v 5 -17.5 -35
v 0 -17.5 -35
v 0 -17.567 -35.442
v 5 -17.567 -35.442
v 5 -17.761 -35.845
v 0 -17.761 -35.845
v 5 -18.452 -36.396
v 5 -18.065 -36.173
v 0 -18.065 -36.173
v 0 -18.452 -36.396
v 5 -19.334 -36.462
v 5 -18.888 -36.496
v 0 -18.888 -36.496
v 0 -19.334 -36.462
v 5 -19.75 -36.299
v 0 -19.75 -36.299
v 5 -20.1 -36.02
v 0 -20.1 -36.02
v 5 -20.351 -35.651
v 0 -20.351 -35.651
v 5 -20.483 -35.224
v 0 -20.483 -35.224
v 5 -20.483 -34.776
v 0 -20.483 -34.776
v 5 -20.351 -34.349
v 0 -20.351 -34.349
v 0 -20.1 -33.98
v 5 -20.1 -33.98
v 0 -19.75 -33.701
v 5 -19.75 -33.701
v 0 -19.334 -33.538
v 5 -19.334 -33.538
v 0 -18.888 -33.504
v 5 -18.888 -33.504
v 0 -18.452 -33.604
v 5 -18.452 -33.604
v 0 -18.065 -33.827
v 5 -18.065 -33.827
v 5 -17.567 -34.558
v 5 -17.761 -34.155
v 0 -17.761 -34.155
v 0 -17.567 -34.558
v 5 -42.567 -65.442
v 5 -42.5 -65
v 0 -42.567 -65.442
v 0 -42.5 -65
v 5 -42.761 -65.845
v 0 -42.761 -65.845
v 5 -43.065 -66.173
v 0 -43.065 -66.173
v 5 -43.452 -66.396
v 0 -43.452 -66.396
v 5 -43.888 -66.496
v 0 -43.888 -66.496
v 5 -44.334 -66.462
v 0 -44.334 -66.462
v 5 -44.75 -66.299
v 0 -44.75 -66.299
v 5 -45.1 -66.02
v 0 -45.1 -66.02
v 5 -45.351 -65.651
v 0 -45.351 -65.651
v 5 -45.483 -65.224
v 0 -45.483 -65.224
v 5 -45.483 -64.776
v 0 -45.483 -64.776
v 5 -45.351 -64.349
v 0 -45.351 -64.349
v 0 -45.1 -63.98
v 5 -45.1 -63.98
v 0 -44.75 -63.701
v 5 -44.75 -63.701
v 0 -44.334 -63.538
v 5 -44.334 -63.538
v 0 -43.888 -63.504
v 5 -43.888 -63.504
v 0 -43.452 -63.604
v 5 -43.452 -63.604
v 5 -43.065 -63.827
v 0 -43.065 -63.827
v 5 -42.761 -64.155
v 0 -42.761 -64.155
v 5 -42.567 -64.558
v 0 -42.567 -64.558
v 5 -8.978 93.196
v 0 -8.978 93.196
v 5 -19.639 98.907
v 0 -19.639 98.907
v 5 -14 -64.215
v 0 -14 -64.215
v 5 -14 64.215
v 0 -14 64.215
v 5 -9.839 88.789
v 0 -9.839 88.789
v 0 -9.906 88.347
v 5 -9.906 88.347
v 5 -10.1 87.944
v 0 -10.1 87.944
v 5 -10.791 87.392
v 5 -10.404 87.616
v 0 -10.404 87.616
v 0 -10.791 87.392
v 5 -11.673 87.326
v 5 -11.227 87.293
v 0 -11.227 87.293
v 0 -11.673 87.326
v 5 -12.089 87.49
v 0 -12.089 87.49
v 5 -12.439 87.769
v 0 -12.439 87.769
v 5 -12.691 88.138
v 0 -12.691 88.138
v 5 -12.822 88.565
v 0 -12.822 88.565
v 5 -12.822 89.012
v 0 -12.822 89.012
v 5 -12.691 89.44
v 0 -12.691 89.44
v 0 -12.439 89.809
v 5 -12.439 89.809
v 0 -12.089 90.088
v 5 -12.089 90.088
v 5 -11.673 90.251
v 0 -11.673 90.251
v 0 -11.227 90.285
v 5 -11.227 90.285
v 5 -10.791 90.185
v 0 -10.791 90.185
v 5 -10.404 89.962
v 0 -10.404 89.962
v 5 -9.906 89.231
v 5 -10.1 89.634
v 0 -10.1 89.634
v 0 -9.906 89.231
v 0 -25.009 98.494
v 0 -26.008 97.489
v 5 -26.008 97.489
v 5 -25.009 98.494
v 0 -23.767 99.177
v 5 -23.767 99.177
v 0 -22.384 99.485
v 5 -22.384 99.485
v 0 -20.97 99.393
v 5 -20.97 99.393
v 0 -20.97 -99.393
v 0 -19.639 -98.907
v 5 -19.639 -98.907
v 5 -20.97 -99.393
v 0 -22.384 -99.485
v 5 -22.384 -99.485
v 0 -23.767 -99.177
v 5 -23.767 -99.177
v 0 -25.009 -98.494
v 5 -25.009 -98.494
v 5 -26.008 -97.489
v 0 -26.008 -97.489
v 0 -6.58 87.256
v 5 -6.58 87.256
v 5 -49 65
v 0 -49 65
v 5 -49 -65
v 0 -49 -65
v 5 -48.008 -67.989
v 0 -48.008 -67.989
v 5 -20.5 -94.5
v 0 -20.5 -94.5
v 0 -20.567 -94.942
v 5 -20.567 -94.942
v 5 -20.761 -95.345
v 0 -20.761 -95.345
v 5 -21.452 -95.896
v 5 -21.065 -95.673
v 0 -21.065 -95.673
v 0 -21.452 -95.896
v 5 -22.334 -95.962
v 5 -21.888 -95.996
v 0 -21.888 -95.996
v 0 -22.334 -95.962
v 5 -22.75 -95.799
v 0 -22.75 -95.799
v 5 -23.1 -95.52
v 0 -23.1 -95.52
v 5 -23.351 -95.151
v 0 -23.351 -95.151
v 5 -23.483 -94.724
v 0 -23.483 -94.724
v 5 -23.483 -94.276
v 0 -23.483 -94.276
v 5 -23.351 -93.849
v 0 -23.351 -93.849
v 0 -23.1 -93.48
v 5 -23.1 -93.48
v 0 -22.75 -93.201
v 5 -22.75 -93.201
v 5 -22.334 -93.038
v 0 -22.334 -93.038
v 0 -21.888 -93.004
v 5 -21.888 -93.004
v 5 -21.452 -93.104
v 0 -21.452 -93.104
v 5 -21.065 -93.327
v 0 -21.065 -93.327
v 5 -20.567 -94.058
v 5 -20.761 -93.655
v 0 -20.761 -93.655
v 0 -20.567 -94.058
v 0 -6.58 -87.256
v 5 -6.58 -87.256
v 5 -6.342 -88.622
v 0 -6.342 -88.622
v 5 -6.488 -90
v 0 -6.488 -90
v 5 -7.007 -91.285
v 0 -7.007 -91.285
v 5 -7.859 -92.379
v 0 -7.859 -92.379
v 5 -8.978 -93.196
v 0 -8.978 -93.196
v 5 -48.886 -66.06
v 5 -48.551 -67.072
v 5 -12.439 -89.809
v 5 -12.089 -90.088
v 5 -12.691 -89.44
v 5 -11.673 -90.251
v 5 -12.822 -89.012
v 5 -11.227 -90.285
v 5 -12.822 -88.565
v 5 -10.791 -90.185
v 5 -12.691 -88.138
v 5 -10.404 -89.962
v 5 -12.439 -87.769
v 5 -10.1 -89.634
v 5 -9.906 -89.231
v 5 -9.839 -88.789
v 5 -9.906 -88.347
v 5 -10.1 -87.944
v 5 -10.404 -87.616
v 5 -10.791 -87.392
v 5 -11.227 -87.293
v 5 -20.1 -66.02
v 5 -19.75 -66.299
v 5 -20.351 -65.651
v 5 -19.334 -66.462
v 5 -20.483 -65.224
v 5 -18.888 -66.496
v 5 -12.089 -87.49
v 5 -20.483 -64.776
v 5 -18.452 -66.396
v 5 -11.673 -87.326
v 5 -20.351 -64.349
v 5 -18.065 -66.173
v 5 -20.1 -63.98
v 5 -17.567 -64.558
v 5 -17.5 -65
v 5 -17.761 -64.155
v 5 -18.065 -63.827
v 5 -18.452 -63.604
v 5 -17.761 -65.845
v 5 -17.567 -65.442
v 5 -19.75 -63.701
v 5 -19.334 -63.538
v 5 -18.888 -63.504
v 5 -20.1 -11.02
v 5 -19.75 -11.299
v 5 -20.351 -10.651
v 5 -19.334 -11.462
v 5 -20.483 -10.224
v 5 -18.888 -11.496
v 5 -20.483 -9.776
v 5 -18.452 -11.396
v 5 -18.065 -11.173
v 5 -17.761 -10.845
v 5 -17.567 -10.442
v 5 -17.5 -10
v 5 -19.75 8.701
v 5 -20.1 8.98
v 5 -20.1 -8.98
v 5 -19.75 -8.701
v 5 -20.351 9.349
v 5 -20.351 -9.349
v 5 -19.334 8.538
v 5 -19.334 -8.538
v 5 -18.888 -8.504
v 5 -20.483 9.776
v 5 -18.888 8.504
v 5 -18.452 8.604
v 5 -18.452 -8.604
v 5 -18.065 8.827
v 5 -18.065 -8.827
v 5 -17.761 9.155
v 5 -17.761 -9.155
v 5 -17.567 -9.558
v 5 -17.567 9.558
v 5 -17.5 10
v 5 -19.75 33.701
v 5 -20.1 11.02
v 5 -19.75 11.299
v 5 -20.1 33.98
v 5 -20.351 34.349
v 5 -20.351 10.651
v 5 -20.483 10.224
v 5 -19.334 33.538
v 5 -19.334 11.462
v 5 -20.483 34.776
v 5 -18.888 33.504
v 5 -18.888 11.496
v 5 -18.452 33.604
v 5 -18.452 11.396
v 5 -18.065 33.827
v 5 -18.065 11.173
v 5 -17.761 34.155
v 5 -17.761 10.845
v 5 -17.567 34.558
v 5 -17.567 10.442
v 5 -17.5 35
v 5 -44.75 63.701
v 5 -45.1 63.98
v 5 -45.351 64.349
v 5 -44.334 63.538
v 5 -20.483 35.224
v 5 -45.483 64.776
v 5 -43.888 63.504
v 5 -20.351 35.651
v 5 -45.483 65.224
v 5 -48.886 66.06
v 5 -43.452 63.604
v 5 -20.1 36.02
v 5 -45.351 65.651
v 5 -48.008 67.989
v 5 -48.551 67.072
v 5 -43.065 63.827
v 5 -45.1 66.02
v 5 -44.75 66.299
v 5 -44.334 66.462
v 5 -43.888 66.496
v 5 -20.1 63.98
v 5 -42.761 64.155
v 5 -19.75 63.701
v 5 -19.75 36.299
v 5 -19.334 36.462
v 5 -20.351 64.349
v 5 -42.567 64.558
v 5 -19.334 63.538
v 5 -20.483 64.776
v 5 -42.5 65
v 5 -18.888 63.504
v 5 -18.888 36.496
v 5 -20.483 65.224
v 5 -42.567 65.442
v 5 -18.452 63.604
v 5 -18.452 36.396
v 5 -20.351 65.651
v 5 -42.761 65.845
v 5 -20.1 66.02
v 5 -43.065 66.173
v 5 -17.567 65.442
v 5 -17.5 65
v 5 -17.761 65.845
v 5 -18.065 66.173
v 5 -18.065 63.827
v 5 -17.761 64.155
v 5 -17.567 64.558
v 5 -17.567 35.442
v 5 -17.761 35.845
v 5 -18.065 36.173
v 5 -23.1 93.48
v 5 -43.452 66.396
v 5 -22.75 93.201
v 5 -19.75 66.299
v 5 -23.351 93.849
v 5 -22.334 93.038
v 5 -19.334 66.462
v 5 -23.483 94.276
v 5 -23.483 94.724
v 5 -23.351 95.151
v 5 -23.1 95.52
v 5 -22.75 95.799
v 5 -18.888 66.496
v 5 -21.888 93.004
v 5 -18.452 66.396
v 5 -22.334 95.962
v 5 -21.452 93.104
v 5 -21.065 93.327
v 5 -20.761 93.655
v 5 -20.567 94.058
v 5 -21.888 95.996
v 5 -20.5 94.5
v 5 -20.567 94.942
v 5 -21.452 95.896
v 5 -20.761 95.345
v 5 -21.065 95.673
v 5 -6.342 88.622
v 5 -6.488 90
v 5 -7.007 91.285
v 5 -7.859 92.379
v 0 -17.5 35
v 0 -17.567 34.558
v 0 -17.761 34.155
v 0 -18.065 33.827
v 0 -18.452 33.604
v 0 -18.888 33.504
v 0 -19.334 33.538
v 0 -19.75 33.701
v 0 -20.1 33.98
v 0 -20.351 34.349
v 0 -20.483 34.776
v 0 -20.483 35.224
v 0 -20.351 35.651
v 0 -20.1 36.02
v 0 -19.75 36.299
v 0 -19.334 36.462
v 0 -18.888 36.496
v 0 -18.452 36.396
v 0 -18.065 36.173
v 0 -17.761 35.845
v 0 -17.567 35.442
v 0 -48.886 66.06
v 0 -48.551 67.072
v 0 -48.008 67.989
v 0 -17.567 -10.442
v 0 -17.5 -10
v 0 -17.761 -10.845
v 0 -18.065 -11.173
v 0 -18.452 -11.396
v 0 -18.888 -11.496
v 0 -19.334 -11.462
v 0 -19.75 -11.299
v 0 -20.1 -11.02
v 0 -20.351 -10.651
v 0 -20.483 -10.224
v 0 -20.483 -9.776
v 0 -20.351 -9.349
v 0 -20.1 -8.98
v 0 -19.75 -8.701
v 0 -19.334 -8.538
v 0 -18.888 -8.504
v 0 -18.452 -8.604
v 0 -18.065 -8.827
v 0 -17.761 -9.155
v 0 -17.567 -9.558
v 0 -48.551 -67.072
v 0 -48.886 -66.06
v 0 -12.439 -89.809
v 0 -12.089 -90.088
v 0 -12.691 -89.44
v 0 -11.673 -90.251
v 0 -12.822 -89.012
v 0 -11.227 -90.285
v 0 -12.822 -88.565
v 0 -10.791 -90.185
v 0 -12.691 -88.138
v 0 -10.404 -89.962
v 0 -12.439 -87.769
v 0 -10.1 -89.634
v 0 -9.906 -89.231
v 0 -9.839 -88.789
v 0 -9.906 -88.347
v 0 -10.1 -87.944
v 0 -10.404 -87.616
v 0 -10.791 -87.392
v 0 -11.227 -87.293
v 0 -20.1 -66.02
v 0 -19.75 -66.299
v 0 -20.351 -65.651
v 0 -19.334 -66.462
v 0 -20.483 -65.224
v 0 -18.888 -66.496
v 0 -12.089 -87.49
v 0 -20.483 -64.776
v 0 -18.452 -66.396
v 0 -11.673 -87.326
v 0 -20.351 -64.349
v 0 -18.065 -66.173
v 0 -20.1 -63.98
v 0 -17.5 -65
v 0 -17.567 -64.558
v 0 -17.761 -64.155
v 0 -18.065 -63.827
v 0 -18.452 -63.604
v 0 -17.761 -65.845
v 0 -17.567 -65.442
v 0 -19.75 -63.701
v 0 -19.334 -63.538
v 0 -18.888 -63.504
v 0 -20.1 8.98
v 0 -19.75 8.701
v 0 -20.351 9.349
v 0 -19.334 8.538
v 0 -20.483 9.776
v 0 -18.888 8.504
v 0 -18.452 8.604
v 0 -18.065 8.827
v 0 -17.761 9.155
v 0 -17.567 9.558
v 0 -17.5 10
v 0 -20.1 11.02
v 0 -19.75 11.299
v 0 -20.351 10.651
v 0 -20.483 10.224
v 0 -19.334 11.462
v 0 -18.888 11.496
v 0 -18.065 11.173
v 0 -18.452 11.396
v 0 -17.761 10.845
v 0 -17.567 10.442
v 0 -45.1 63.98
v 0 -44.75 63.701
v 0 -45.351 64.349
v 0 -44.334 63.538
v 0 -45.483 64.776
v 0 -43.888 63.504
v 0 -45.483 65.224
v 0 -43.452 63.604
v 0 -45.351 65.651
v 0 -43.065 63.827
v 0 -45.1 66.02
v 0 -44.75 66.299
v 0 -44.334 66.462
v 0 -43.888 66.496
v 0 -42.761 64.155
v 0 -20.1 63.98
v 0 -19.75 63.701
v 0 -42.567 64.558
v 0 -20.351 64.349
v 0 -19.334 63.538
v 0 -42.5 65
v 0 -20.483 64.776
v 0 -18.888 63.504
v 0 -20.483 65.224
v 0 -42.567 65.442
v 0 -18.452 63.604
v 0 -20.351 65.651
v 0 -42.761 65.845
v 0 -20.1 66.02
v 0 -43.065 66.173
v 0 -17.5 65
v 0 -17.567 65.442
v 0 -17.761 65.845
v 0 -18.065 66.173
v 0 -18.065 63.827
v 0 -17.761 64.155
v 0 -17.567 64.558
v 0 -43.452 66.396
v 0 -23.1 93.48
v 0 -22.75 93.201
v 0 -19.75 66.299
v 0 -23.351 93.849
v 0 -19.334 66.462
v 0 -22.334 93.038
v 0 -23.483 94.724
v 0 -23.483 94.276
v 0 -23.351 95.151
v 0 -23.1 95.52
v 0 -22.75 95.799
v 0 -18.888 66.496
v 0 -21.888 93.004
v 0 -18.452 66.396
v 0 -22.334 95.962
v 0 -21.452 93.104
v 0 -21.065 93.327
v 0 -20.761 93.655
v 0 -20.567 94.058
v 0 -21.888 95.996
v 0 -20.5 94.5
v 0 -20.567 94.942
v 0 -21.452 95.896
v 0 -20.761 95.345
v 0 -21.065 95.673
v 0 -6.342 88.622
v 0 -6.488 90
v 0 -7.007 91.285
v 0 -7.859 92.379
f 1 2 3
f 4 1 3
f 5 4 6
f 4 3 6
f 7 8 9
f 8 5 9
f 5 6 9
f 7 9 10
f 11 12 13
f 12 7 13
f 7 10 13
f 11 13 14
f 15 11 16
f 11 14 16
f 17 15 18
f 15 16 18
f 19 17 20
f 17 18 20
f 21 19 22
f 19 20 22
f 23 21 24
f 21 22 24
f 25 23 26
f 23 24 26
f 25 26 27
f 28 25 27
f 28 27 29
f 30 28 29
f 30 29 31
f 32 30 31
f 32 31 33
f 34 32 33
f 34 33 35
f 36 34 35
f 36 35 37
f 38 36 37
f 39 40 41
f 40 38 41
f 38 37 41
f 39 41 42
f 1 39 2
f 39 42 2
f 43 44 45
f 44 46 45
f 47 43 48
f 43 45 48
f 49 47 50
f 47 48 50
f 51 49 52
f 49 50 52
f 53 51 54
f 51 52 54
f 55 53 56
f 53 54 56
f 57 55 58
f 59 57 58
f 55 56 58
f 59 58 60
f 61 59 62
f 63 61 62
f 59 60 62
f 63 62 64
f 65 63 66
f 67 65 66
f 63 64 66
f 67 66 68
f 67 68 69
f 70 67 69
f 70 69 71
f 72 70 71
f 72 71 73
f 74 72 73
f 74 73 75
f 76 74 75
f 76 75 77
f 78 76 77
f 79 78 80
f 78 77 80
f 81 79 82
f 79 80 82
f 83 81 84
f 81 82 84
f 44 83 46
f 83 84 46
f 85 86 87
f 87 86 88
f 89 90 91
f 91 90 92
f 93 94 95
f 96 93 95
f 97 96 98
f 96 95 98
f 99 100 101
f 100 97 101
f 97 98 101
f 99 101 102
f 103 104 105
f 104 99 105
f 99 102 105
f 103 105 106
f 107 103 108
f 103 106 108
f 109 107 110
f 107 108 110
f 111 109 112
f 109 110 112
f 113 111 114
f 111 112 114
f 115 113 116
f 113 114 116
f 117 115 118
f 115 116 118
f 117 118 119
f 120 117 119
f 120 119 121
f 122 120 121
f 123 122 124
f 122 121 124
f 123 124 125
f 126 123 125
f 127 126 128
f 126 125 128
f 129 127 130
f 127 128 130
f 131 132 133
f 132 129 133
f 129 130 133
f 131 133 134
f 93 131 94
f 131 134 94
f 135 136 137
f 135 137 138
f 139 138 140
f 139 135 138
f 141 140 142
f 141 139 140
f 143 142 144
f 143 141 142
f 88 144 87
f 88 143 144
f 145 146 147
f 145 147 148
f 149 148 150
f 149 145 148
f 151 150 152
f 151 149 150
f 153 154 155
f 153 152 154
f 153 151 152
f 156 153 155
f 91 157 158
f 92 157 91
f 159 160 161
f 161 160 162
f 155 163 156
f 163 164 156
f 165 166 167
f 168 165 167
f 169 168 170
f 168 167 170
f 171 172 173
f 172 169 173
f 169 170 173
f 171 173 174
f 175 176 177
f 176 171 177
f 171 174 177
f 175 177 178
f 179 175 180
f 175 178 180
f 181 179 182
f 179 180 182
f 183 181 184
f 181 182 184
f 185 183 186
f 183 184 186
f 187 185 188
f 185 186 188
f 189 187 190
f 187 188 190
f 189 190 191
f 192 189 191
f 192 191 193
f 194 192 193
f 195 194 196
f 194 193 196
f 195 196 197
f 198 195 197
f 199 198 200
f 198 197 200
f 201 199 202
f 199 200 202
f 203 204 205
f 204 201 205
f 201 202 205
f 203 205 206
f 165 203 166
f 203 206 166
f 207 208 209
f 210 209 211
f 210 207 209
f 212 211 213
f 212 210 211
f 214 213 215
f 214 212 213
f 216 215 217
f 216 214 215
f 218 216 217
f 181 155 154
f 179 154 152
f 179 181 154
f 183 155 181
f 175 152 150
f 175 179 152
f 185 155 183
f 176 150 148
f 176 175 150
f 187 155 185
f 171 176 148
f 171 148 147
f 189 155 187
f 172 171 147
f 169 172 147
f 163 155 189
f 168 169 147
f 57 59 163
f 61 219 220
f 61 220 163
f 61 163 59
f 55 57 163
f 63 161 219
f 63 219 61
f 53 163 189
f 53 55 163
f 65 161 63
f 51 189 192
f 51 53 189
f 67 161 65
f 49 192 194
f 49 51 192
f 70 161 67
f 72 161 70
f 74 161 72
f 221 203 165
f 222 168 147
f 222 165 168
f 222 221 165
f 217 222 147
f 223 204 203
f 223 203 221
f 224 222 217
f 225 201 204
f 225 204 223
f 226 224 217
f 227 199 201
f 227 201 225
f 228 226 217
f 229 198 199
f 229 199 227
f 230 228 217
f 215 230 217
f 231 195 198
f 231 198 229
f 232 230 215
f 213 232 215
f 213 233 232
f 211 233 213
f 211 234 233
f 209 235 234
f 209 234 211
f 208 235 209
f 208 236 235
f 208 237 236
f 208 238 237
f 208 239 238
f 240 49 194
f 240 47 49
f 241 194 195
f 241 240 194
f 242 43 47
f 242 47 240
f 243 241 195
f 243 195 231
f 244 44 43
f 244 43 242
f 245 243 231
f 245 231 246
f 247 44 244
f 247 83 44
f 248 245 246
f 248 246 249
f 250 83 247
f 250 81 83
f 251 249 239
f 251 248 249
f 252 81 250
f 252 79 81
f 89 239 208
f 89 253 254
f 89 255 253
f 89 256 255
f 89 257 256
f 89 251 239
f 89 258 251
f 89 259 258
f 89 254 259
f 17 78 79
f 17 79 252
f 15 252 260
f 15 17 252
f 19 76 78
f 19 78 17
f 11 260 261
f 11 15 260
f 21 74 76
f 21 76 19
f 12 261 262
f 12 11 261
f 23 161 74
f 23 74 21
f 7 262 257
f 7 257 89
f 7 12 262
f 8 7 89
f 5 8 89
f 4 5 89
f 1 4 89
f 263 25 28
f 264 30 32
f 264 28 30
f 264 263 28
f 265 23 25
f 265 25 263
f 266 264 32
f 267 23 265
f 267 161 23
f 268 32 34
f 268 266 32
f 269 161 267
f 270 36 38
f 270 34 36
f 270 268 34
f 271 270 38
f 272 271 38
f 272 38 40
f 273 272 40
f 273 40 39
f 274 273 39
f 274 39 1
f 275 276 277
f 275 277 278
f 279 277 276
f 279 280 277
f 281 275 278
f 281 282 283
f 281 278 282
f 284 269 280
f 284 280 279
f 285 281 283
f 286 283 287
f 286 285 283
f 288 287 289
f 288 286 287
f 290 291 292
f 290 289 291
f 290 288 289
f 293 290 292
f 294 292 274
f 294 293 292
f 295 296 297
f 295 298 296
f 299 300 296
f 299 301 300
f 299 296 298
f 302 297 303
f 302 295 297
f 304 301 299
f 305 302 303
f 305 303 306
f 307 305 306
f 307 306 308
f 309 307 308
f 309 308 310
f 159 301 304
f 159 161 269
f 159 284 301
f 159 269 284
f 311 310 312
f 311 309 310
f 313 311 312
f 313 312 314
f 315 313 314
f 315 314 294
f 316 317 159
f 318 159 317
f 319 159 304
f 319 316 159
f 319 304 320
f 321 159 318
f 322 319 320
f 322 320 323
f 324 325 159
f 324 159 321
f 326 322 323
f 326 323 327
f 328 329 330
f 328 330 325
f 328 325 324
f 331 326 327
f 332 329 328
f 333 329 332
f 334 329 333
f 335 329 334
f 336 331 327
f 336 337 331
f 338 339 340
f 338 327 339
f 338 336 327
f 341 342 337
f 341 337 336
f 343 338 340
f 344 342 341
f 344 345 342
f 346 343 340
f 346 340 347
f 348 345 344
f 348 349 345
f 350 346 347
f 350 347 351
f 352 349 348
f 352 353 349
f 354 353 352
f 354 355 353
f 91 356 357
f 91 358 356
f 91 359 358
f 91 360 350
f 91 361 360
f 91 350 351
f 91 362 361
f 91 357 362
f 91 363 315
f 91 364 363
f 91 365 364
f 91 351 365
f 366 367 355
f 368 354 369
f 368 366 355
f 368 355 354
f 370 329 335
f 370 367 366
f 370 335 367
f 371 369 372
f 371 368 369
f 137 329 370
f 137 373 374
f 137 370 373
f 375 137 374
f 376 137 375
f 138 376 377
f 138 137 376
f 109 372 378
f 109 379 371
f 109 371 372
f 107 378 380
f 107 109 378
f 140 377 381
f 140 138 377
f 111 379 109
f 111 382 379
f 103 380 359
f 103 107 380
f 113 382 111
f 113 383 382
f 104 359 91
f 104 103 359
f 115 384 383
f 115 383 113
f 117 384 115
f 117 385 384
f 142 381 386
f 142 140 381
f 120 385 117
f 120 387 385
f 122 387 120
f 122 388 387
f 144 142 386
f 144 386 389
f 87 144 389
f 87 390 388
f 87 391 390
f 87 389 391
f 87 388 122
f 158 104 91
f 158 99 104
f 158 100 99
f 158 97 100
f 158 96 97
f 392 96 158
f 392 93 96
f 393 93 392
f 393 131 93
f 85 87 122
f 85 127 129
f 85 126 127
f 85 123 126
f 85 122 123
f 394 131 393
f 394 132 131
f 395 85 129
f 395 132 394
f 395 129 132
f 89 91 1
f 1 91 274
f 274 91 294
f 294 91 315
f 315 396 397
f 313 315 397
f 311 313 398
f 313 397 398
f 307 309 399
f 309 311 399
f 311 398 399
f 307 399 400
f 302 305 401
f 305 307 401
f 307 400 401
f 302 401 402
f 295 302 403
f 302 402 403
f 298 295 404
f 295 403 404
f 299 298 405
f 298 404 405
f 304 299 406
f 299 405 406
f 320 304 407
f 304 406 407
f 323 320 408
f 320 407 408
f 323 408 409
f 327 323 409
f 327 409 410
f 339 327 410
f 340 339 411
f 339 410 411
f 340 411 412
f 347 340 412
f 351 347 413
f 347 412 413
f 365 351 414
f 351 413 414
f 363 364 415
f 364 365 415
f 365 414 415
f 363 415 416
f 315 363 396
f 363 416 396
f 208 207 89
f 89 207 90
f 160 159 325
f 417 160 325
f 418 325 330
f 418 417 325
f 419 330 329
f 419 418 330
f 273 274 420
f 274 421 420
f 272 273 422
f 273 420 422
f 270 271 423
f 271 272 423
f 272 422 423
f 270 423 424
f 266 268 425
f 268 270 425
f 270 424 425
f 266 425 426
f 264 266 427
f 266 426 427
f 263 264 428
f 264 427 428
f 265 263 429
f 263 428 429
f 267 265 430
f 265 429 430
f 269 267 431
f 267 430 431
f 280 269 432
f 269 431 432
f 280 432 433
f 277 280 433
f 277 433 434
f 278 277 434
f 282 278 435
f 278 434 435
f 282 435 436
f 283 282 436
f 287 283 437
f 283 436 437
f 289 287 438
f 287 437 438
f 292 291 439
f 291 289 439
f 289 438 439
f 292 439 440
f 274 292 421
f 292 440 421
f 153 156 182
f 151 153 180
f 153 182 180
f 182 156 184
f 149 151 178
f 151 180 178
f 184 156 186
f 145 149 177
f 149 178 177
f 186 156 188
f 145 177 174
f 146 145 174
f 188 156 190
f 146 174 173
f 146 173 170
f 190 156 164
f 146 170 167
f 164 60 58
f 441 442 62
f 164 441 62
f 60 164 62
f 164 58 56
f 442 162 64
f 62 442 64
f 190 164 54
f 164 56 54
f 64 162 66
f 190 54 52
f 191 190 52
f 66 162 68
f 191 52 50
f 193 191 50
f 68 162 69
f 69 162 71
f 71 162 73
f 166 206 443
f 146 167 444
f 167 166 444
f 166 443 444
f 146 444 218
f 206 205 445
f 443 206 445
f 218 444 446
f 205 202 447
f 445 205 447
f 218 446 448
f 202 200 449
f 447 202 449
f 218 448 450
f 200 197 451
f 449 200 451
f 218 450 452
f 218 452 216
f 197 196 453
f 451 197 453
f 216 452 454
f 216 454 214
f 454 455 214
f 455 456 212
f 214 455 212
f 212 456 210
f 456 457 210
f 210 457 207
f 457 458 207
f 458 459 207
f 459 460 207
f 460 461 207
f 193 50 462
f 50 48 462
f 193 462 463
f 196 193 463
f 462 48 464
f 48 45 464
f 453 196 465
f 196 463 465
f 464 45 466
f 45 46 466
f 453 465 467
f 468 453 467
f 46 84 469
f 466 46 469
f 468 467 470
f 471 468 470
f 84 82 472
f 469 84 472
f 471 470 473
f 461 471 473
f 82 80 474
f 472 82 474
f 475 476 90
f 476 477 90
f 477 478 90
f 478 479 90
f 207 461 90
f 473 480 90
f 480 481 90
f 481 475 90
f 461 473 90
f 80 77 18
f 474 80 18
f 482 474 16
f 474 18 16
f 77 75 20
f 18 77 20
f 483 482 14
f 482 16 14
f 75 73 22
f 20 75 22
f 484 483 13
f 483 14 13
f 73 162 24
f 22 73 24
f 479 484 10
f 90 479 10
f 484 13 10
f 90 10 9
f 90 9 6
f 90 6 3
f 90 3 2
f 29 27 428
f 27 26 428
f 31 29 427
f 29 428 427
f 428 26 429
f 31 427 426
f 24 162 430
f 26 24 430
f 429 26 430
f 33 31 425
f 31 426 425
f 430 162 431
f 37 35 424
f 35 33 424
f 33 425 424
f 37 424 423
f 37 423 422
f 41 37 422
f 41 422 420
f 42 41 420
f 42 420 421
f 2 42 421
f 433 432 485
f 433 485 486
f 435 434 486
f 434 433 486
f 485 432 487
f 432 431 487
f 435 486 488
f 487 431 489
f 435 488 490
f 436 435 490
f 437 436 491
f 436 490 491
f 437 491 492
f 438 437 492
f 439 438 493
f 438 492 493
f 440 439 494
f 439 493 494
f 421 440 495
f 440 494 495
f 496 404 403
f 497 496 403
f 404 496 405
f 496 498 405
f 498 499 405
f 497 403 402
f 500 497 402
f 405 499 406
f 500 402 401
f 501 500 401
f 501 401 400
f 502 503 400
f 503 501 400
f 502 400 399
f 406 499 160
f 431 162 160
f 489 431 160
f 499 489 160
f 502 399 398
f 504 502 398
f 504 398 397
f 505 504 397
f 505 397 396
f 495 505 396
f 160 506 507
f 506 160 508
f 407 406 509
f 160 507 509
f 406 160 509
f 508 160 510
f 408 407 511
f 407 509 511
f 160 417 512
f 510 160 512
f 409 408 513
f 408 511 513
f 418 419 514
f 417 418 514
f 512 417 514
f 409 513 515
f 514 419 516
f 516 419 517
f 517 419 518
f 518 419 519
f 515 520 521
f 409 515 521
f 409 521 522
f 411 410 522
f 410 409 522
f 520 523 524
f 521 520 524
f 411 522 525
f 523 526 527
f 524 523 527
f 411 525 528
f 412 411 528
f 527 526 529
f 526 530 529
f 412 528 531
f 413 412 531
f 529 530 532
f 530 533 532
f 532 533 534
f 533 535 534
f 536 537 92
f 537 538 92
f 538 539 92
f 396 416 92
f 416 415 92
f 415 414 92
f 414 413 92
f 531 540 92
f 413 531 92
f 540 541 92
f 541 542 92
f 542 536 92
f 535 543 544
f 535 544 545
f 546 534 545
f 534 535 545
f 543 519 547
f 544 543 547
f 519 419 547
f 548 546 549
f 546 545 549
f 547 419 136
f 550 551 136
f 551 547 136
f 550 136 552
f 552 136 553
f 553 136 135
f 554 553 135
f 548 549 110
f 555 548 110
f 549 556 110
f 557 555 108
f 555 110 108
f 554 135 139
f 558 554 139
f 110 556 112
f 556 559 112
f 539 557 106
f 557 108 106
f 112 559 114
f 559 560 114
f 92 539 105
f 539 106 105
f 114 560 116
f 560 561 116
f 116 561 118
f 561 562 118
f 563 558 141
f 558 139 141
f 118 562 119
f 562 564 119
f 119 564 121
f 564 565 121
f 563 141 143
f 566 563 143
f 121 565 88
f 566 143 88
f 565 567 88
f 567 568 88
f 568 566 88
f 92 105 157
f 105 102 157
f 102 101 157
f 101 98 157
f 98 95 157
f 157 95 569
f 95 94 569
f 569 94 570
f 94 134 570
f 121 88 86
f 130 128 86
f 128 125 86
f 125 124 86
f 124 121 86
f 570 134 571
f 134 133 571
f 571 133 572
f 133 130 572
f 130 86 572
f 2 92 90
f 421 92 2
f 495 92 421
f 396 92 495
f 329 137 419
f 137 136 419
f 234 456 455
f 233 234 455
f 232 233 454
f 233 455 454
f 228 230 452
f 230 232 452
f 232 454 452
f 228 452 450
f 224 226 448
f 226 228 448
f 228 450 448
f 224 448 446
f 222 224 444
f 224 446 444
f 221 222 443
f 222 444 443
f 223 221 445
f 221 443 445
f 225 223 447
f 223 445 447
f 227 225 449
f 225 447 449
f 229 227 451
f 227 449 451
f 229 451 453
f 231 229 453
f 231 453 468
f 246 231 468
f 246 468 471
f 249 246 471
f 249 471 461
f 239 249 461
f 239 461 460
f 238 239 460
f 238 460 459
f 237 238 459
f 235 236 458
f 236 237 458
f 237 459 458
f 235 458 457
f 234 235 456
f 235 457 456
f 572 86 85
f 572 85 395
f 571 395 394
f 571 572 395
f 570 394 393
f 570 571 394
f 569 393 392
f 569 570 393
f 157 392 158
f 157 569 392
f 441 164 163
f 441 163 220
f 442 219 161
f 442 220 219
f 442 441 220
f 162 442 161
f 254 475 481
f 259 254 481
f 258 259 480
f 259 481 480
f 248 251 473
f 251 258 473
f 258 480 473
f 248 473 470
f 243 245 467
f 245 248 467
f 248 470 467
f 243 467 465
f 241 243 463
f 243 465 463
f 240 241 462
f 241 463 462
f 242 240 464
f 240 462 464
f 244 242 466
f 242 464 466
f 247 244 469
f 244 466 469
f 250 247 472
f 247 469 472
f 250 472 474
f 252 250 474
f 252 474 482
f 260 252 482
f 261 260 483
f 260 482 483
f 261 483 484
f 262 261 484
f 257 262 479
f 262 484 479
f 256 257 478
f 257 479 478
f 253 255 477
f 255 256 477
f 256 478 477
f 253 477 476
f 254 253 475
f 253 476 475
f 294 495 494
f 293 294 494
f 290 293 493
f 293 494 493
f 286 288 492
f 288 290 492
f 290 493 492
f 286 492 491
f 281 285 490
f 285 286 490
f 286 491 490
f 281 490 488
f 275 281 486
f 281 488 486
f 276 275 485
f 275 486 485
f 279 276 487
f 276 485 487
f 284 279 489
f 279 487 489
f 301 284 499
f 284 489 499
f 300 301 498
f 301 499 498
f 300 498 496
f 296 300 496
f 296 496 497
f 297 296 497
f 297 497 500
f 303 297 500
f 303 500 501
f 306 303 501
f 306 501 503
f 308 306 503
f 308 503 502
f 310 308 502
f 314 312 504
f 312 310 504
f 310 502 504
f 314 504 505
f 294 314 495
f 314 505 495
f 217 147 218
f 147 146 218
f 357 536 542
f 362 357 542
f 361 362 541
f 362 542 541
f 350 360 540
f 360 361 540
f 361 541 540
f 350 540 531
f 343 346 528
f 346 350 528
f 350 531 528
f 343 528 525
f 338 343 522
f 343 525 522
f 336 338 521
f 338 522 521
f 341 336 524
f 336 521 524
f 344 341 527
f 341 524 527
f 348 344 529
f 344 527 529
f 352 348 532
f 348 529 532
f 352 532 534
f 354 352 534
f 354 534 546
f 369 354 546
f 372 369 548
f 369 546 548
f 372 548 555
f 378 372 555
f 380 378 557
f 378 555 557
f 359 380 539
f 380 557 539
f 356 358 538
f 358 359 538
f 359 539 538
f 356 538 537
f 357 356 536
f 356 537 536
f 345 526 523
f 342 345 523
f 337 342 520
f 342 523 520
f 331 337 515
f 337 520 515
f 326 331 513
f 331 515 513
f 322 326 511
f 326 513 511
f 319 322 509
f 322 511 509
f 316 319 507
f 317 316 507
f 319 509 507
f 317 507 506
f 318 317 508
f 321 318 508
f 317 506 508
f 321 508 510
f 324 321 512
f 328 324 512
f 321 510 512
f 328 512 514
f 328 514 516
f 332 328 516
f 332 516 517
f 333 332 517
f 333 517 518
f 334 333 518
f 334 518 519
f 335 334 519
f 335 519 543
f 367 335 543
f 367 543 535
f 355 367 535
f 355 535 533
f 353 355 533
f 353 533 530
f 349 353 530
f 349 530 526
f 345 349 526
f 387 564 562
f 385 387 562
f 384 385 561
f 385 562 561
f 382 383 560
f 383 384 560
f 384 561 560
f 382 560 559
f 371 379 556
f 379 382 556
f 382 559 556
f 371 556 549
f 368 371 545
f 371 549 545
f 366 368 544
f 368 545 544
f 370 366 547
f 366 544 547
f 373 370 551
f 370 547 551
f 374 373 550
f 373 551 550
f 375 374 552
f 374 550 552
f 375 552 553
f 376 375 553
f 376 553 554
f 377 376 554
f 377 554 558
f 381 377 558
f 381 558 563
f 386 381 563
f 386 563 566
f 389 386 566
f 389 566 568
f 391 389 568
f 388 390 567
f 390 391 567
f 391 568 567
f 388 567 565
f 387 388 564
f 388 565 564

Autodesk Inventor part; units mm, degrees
ref_plane "YZ Plane" through (0, 0, 0) normal (1, 0, 0) x (0, 1, 0)
ref_plane "XZ Plane" through (0, 0, 0) normal (0, 1, 0) x (-1, 0, 0)
ref_plane "XY Plane" through (0, 0, 0) normal (0, 0, 1) x (1, 0, 0)
sketch "Sketch1" plane through (0, 0, 0) normal (1, 0, 0) x (0, 1, 0)
  circle A0 centre (0, -124) radius 1.95
  circle A1 centre (0, 124) radius 1.95
  circle A2 centre (-19, -65) radius 1.5
  circle A3 centre (-19, 65) radius 1.5
  line L0 (0, 124) -> (-19, 65) construction
  line L1 (4.7593, 122.4673) -> (-14.2407, 63.4673)
  line L2 (-23.7593, 66.5327) -> (-4.7593, 125.5327)
  arc A4 (4.7593, 122.4673) -> (-4.7593, 125.5327) centre (0, 124) ccw
  arc A5 (-23.7593, 66.5327) -> (-14.2407, 63.4673) centre (-19, 65) ccw
  line L3 (-19, 65) -> (-19, -65) construction
  line L4 (-24, 65) -> (-24, -65)
  line L5 (-14, -65) -> (-14, 65)
  arc A6 (-14, 65) -> (-24, 65) centre (-19, 65) ccw
  arc A7 (-24, -65) -> (-14, -65) centre (-19, -65) ccw
  line L6 (-19, -65) -> (0, -124) construction
  line L7 (-23.7593, -66.5327) -> (-4.7593, -125.5327)
  line L8 (4.7593, -122.4673) -> (-14.2407, -63.4673)
  arc A8 (-14.2407, -63.4673) -> (-23.7593, -66.5327) centre (-19, -65) ccw
  arc A9 (-4.7593, -125.5327) -> (4.7593, -122.4673) centre (0, -124) ccw
  circle A10 centre (-44, 65) radius 1.5
  circle A11 centre (-44, -65) radius 1.5
  line L9 (-19, 65) -> (-44, 65) construction
  line L10 (-19, 67) -> (-44, 67)
  line L11 (-44, 63) -> (-19, 63)
  arc A12 (-19, 63) -> (-19, 67) centre (-19, 65) ccw
  arc A13 (-44, 67) -> (-44, 63) centre (-44, 65) ccw
  line L12 (-19, -65) -> (-44, -65) construction
  line L13 (-19, -63) -> (-44, -63)
  line L14 (-44, -67) -> (-19, -67)
  arc A14 (-19, -67) -> (-19, -63) centre (-19, -65) ccw
  arc A15 (-44, -63) -> (-44, -67) centre (-44, -65) ccw
  line L15 (0, 124) -> (-44, 65) construction
  line L16 (-4.0081, 126.9891) -> (-48.0081, 67.9891)
  line L17 (-39.9919, 62.0109) -> (4.0081, 121.0109)
  arc A16 (4.0081, 121.0109) -> (-4.0081, 126.9891) centre (0, 124) ccw
  arc A17 (-48.0081, 67.9891) -> (-39.9919, 62.0109) centre (-44, 65) ccw
  line L18 (-44, -65) -> (0, -124) construction
  line L19 (-48.0081, -67.9891) -> (-4.0081, -126.9891)
  line L20 (4.0081, -121.0109) -> (-39.9919, -62.0109)
  arc A18 (-39.9919, -62.0109) -> (-48.0081, -67.9891) centre (-44, -65) ccw
  arc A19 (-4.0081, -126.9891) -> (4.0081, -121.0109) centre (0, -124) ccw
  line L21 (-44, 65) -> (-44, -65) construction
  line L22 (-49, 65) -> (-49, -65)
  line L23 (-39, -65) -> (-39, 65)
  arc A20 (-39, 65) -> (-49, 65) centre (-44, 65) ccw
  arc A21 (-49, -65) -> (-39, -65) centre (-44, -65) ccw
  line L24 (-44, 65) -> (-19, 0) construction
  line L25 (-45.4, 64.4615) -> (-20.4, -0.5385)
  line L26 (-17.6, 0.5385) -> (-42.6, 65.5385)
  arc A22 (-42.6, 65.5385) -> (-45.4, 64.4615) centre (-44, 65) ccw
  arc A23 (-20.4, -0.5385) -> (-17.6, 0.5385) centre (-19, 0) ccw
  line L27 (-44, -65) -> (-19, 0) construction
  line L28 (-42.6, -65.5385) -> (-17.6, -0.5385)
  line L29 (-20.4, 0.5385) -> (-45.4, -64.4615)
  arc A24 (-45.4, -64.4615) -> (-42.6, -65.5385) centre (-44, -65) ccw
  arc A25 (-17.6, -0.5385) -> (-20.4, 0.5385) centre (-19, 0) ccw
  line L30 (-19, 0) -> (-44, 0) construction
  line L31 (-19, 1.5) -> (-44, 1.5)
  line L32 (-44, -1.5) -> (-19, -1.5)
  arc A26 (-19, -1.5) -> (-19, 1.5) centre (-19, 0) ccw
  arc A27 (-44, 1.5) -> (-44, -1.5) centre (-44, 0) ccw
  circle A28 centre (-19, -10) radius 1.5
  circle A29 centre (-19, -35) radius 1.5
  circle A30 centre (-19, 10) radius 1.5
  circle A31 centre (-19, 35) radius 1.5
  circle A32 centre (0, -124) radius 12.5
  circle A33 centre (0, 124) radius 12.5
  circle A34 centre (-22, 94.5) radius 1.5
  circle A35 centre (-22, -94.5) radius 1.5
  circle A36 centre (-11.3392, 88.7888) radius 1.5
  circle A37 centre (-11.3392, -88.7888) radius 1.5
  circle A38 centre (-11.3392, 88.7888) radius 5
  circle A39 centre (-22, 94.5) radius 5
  circle A40 centre (-11.3392, -88.7888) radius 5
  circle A41 centre (-22, -94.5) radius 5
  circle A42 centre (-19, 65) radius 4
  circle A43 centre (-44, 65) radius 4
  circle A44 centre (-19, -65) radius 4
  circle A45 centre (-44, -65) radius 4
  circle A46 centre (-19, 0) radius 1
  line L33 (-22, 94.5) -> (-11.3392, 88.7888) construction
  line L34 (-24.3611, 90.0926) -> (-13.7003, 84.3814)
  line L35 (-8.9781, 93.1962) -> (-19.6389, 98.9074)
  arc A47 (-19.6389, 98.9074) -> (-24.3611, 90.0926) centre (-22, 94.5) ccw
  arc A48 (-13.7003, 84.3814) -> (-8.9781, 93.1962) centre (-11.3392, 88.7888) ccw
  line L36 (-11.3392, -88.7888) -> (-22, -94.5) construction
  line L37 (-13.7003, -84.3814) -> (-24.3611, -90.0926)
  line L38 (-19.6389, -98.9074) -> (-8.9781, -93.1962)
  arc A49 (-8.9781, -93.1962) -> (-13.7003, -84.3814) centre (-11.3392, -88.7888) ccw
  arc A50 (-24.3611, -90.0926) -> (-19.6389, -98.9074) centre (-22, -94.5) ccw
  circle A51 centre (0, -124) radius 15
  circle A52 centre (0, 124) radius 15
  point P0 (0, 0)
  point P1 (-9.5, 94.5)
  point P2 (-9.5, -94.5)
  point P3 (-14, -64.2148)
  point P4 (-14, 64.2148)
  point P5 (-24, 65)
  point P6 (-23.7593, -66.5327)
  point P7 (-31.5, 65)
  point P8 (-31.5, -65)
  point P9 (-44, 0)
  point P10 (-31.5, 32.5)
  point P11 (-31.5, -32.5)
  point P12 (-39, 47.8215)
  point P13 (-24, 8.8215)
  point P14 (-24, 17.1785)
  point P15 (-41.6236, 63)
  point P16 (-24, 63)
  point P17 (-23.6088, 67)
  point P18 (-36.2712, 67)
  point P19 (-13.9854, 96.8832)
  point P20 (-6.8749, 118.9633)
  point P21 (-43.3898, 70)
  point P22 (-46.5, 65)
  point P23 (-46.5, -65)
  point P24 (-43.3898, -70)
  point P25 (-6.8749, -118.9633)
  point P26 (-13.9854, -96.8832)
  point P27 (-36.2712, -67)
  point P28 (-23.6088, -67)
  point P29 (-24, -63)
  point P30 (-41.6236, -63)
  point P31 (-24, -17.1785)
  point P32 (-24, -8.8215)
  point P33 (-39, -47.8215)
  point P34 (-31.5, 0)
  point P35 (-39, -1.5)
  point P36 (-24, -1.5)
  point P37 (-24, 1.5)
  point P38 (-39, 1.5)
  point P39 (-49, -65)
  point P40 (-24, -65)
  point P41 (-4.0081, -126.9891)
  point P42 (-4.0081, 126.9891)
  point P43 (-14.2407, -63.4673)
  point P44 (-4.0081, 126.9891)
  point P45 (-14.2407, 63.4673)
  point P46 (4.7593, 122.4673)
  point P47 (-14.2407, -63.4673)
  point P48 (-39, 63)
  point P49 (-23.5826, 67)
  point P50 (-14, 65)
  point P51 (-39, -63)
  point P52 (-39, -56.1785)
  point P53 (-39, 56.1785)
  point P54 (-10.8571, -117.8053)
  point P55 (1.2475, -111.5624)
  point P56 (-10.8571, 117.8053)
  point P57 (1.2475, 111.5624)
  point P58 (-40.8878, -61.0867)
  point P59 (-41.5, 60.6699)
  point P60 (-23.7593, 66.5327)
  point P61 (-16.0985, -90.3215)
  point P62 (-6.5799, -87.2562)
  point P63 (-6.5799, 87.2562)
  point P64 (-16.0985, 90.3215)
  point P65 (-17.9919, 91.5109)
  point P66 (-26.0081, 97.4891)
  point P67 (-26.0081, -97.4891)
  point P68 (-17.9919, -91.5109)
  point P69 (-16.5, -61.8775)
  point P70 (-15.6632, -67.2059)
  point P71 (-22.4641, -67)
  point P72 (-20.4225, -68.7385)
  point P73 (-21.5, -61.8775)
  point P74 (-22.4641, -63)
  point P75 (-40.5359, -63)
  point P76 (-41.2689, -62.0775)
  point P77 (-46.5, -61.8775)
  point P78 (-44.1374, -68.9976)
  point P79 (-41.2689, 62.0775)
  point P80 (-40.5359, 63)
  point P81 (-44.1374, 68.9976)
  point P82 (-46.5, 61.8775)
  point P83 (-22.4641, 63)
  point P84 (-21.5, 61.8775)
  point P85 (-20.4225, 68.7385)
  point P86 (-22.4641, 67)
  point P87 (-16.5, 61.8775)
  point P88 (-15.6632, 67.2059)
  point P89 (-16.6696, 91.6444)
  point P90 (-16.6696, -91.6444)
  point P91 (-19.6389, 98.9074)
  point P92 (-20.5658, 88.0594)
  point P93 (-17.3771, 86.3511)
  point P94 (-8.9781, 93.1962)
  point P95 (-8.9781, -93.1962)
  point P96 (-17.3771, -86.3511)
  point P97 (-20.5658, -88.0594)
  point P98 (-19.6389, -98.9074)
  point P99 (-24, -65)
  point P100 (-23.5826, -63)
  point P101 (-23.5826, -67)
  point P102 (-39, -63.3409)
  point P103 (-44.9251, 63.2268)
  point P104 (-39, 63.3409)
  point P105 (-23.5826, 63)
  point P106 (-24, 65)
  point P107 (-14.2613, -96.0265)
  point P108 (-14.2613, 96.0265)
  point P109 (-40.5359, 67)
  point P110 (-40.5359, -67)
  point P111 (0.4243, 109.006)
  point P112 (-12.4626, 115.6524)
  point P113 (-14.5206, 96.1655)
  point P114 (-12.4626, -115.6524)
  point P115 (0.4243, -109.006)
  point P116 (-14.5206, -96.1655)
  dimension "d2" = 3.9
  dimension "d4" = 3.9
  dimension "d25" = 3
  dimension "d28" = 3
  dimension "d43" = 59
  dimension "d44" = 65
  dimension "d45" = 65
  dimension "d47" = 59
  dimension "d48" = 10
  dimension "d49" = 10
  dimension "d50" = 10
  dimension "d53" = 3
  dimension "d54" = 3
  dimension "d55" = 4
  dimension "d56" = 4
  dimension "d57" = 25
  dimension "d58" = 25
  dimension "d59" = 10
  dimension "d60" = 10
  dimension "d61" = 10
  dimension "d62" = 3
  dimension "d63" = 3
  dimension "d64" = 3
  dimension "d65" = 3
  dimension "d66" = 3
  dimension "d67" = 10
  dimension "d68" = 25
  dimension "d69" = 3
  dimension "d70" = 3
  dimension "d71" = 10
  dimension "d72" = 25
  dimension "d73" = 25
  dimension "d74" = 25
  dimension "d76" = 3
  dimension "d78" = 3
  dimension "d79" = 3
  dimension "d80" = 3
  dimension "d81" = 6
  dimension "d82" = 6
  dimension "d83" = 19
  dimension "d84" = 8
  dimension "d85" = 8
  dimension "d86" = 8
  dimension "d87" = 8
  dimension "d88" = 2
  dimension "d89" = 10
  dimension "d90" = 10
  dimension "d91" = 30
  dimension "d92" = 30
extrude "Extrusion1" add sketch "Sketch1" along normal blind 5 contours L1 L5 A6 L10 L2 L34 A38 | A38 | L5 L8 A8 L13 L4 L28 A23 L26 L11 A5 L1 | L1 A5 L11 A42 L10 A6 L5 | L34 L2 A38 | A39 L34 L17 L10 A20 L16 | A39 | L8 A40 L37 L7 L14 A7 L5 | L5 A7 L14 A44 L13 A8 L8 | L2 L34 L17 L35 | L2 L35 A38 | L2 L10 L17 L34 | L17 A39 L35 | A20 L10 A43 L25 A17 | A39 L17 L34 | L11 L4 A5 | A5 A6 L10 A42 L11 | A40 | A6 L2 L10 | L2 A5 L4 L11 L23 L17 L10 | A17 L25 L23 L31 A27 L32 L29 A18 L22 | A20 L23 L17 L11 A43 L10 | L10 L17 L23 A20 | L4 L26 L23 L11 | A42 L10 A12 L11 | L11 A12 L10 A42 | L14 L7 A7 | A7 A8 L13 A44 L14 | A40 L7 L37 | A8 L4 L13 | L25 A43 L26 A17 | A17 L26 L23 L25 | A18 L29 A45 L14 A21 | A43 L11 L26 A10 L25 A13 L10 | L10 A13 L25 A43 | L26 A25 L31 L25 L4 | L4 L25 L23 L26 | L23 L26 A17 L17 L11 | L11 L17 L23 | L7 L14 L20 L23 L13 L4 A7 | L7 L37 L20 L14 | A44 L13 A14 L14 | L14 A14 L13 A44 | L38 L7 A40 | L7 L38 L20 L37 | L13 L23 L28 L4 | L26 A43 L11 L17 A17 | L25 A13 L11 L26 A43 | L25 L4 L31 L23 | A21 L14 L20 L37 A41 L19 | L29 L23 L28 A18 | A18 L28 A45 L29 | L25 L31 L4 | A23 L25 L29 A25 | L14 A21 L23 L20 | L20 A41 L37 | L28 L23 L29 L4 | L4 L29 L32 A23 L28 | L23 L20 L13 | L13 L20 A18 L28 L23 | L26 L11 A43 | L25 A10 L26 L11 A13 | L31 L4 L32 L23 | L23 L32 A27 L31 | A41 | L14 A45 L13 L20 L23 A21 | A18 L20 L13 A45 L28 | L23 L32 L4 L29 | A45 L28 L13 A15 L29 | L29 A15 L14 A45 | L31 L25 L29 L32 L4 | L31 A25 L29 L25 | L38 A41 L20 | L4 L32 L29 | L14 A15 L29 A11 L28 L13 A45 | A45 L13 L28 | A15 L13 L28 A11 L29 | L25 A23 L32 L29 | A46
sketch "Sketch8" plane through (5, 0, 0) normal (1, 0, 0) x (0, 0, -1)
  circle A0 centre (-94.5, -22) radius 1.5 projected
  circle A1 centre (94.5, -22) radius 1.5 projected
  line L0 (97.4891, -26.0081) -> (67.9891, -48.0081) projected
  line L1 (-67.9891, -48.0081) -> (-97.4891, -26.0081) projected
  arc A2 (65, -49) -> (67.9891, -48.0081) centre (65, -44) ccw projected
  line L2 (65, -49) -> (-65, -49) projected
  arc A3 (-67.9891, -48.0081) -> (-65, -49) centre (-65, -44) ccw projected
  line L3 (-87.2562, -6.5799) -> (-64.2148, -14) projected
  line L4 (-64.2148, -14) -> (64.2148, -14) projected
  line L5 (64.2148, -14) -> (87.2562, -6.5799) projected
  circle A4 centre (65, -44) radius 1.5 projected
  circle A5 centre (-65, -19) radius 1.5 projected
  circle A6 centre (65, -19) radius 1.5 projected
  circle A7 centre (88.7888, -11.3392) radius 1.5 projected
  circle A8 centre (-88.7888, -11.3392) radius 1.5 projected
  circle A9 centre (-65, -44) radius 1.5 projected
  arc A10 (-87.2562, -6.5799) -> (-93.1962, -8.9781) centre (-88.7888, -11.3392) ccw projected
  arc A11 (93.1962, -8.9781) -> (87.2562, -6.5799) centre (88.7888, -11.3392) ccw projected
  line L6 (93.1962, -8.9781) -> (98.9074, -19.6389) projected
  arc A12 (97.4891, -26.0081) -> (98.9074, -19.6389) centre (94.5, -22) ccw projected
  arc A13 (-98.9074, -19.6389) -> (-97.4891, -26.0081) centre (-94.5, -22) ccw projected
  line L7 (-98.9074, -19.6389) -> (-93.1962, -8.9781) projected
  circle A14 centre (10, -19) radius 1.5 projected
  circle A15 centre (35, -19) radius 1.5 projected
  circle A16 centre (-10, -19) radius 1.5 projected
  circle A17 centre (-35, -19) radius 1.5 projected
  point P0 (0, 0)
properties part number "Horizontal_bar_support_V2"
